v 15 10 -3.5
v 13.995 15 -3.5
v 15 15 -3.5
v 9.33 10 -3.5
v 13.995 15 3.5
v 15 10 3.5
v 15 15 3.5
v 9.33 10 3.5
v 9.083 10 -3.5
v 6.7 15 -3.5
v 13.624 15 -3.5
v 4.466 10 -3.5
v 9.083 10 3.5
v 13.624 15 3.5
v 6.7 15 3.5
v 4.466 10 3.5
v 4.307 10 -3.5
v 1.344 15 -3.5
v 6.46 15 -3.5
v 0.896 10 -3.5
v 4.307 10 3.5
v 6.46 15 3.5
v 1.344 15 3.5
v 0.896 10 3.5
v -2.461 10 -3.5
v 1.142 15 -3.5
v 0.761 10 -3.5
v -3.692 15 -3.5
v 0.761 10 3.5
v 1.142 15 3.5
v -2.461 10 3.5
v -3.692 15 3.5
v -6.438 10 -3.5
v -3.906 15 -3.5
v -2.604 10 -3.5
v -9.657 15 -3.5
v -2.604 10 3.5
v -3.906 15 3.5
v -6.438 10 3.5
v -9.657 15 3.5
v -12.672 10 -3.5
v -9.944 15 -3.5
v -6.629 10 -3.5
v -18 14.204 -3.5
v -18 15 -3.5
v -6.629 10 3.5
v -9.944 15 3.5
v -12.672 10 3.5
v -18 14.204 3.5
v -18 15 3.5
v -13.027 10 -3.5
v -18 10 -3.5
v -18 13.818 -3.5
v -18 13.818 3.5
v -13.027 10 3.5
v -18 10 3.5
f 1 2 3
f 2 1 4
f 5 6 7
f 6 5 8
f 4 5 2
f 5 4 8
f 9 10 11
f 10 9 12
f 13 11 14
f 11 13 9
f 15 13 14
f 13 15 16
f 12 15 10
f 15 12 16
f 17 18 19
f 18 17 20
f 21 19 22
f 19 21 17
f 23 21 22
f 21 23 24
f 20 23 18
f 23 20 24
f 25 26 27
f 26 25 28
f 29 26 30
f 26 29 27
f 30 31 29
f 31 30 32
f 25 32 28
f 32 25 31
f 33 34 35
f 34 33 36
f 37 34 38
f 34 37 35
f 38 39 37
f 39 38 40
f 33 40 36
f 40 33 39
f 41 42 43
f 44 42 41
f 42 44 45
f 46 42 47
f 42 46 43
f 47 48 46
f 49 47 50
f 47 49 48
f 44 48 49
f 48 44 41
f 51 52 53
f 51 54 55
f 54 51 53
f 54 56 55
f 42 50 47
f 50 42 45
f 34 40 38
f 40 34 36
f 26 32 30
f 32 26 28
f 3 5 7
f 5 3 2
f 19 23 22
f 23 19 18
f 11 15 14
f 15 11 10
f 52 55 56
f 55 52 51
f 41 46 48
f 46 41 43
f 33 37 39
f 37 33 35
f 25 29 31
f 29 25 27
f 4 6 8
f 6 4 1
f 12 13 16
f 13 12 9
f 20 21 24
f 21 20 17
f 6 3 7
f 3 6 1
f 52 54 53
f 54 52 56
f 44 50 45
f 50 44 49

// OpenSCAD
module Arc_02(){

    module Cylinder_Wheel(){    // Create Cylinder Sectors
   
        color("#a8b0b2")
        
        for (i=[0:45:359]) {
            r = 10; // pattern radius
            n = 19; // number of sectors
            step = 360/n;
            for (i=[0:step:359]) {
                angle = i;
                dx = r*cos(angle);
                dy = r*sin(angle);
                //translate([dx,dy,0])
                rotate([0,0,angle])  
                {
                linear_extrude(7, scale = 1, center = true)
                polygon(points=[[0,0],[25,-4],[25,4]]);          
                }    
            }
        }
    }
    
    color("#f2e8d7"){
        difference(){
            Cylinder_Wheel();   // Subtract Cubes to obtain arc
            translate([0,40,0]){
                cube([60,50,100], center = true);
            }
            translate([0,-15,0]){
                cube([60,50,100], center = true);
            }
            translate([45,0,0]){
                cube([60,50,100], center = true);
            }
            translate([-48,0,0]){
                cube([60,50,100], center = true);
            }
        }
    }

}

Arc_02();

// Written by Nicolì Angelo (Gengio) 2024: 
// MIT License


//Permission is hereby granted, free of charge, to any person obtaining a copy of this software and associated documentation files (the "Software"), to deal in the Software without restriction, including without limitation the rights to use, copy, modify, merge, publish, distribute, sublicense, and/or sell copies of the Software, and to permit persons to whom the Software is furnished to do so, subject to the following conditions:

//The above copyright notice and this permission notice shall be included in all copies or substantial portions of the Software.

//THE SOFTWARE IS PROVIDED "AS IS", WITHOUT WARRANTY OF ANY KIND, EXPRESS OR IMPLIED, INCLUDING BUT NOT LIMITED TO THE WARRANTIES OF MERCHANTABILITY, FITNESS FOR A PARTICULAR PURPOSE AND NONINFRINGEMENT. IN NO EVENT SHALL THE AUTHORS OR COPYRIGHT HOLDERS BE LIABLE FOR ANY CLAIM, DAMAGES OR OTHER LIABILITY, WHETHER IN AN ACTION OF CONTRACT, TORT OR OTHERWISE, ARISING FROM, OUT OF OR IN CONNECTION WITH THE SOFTWARE OR THE USE OR OTHER DEALINGS IN THE SOFTWARE.
